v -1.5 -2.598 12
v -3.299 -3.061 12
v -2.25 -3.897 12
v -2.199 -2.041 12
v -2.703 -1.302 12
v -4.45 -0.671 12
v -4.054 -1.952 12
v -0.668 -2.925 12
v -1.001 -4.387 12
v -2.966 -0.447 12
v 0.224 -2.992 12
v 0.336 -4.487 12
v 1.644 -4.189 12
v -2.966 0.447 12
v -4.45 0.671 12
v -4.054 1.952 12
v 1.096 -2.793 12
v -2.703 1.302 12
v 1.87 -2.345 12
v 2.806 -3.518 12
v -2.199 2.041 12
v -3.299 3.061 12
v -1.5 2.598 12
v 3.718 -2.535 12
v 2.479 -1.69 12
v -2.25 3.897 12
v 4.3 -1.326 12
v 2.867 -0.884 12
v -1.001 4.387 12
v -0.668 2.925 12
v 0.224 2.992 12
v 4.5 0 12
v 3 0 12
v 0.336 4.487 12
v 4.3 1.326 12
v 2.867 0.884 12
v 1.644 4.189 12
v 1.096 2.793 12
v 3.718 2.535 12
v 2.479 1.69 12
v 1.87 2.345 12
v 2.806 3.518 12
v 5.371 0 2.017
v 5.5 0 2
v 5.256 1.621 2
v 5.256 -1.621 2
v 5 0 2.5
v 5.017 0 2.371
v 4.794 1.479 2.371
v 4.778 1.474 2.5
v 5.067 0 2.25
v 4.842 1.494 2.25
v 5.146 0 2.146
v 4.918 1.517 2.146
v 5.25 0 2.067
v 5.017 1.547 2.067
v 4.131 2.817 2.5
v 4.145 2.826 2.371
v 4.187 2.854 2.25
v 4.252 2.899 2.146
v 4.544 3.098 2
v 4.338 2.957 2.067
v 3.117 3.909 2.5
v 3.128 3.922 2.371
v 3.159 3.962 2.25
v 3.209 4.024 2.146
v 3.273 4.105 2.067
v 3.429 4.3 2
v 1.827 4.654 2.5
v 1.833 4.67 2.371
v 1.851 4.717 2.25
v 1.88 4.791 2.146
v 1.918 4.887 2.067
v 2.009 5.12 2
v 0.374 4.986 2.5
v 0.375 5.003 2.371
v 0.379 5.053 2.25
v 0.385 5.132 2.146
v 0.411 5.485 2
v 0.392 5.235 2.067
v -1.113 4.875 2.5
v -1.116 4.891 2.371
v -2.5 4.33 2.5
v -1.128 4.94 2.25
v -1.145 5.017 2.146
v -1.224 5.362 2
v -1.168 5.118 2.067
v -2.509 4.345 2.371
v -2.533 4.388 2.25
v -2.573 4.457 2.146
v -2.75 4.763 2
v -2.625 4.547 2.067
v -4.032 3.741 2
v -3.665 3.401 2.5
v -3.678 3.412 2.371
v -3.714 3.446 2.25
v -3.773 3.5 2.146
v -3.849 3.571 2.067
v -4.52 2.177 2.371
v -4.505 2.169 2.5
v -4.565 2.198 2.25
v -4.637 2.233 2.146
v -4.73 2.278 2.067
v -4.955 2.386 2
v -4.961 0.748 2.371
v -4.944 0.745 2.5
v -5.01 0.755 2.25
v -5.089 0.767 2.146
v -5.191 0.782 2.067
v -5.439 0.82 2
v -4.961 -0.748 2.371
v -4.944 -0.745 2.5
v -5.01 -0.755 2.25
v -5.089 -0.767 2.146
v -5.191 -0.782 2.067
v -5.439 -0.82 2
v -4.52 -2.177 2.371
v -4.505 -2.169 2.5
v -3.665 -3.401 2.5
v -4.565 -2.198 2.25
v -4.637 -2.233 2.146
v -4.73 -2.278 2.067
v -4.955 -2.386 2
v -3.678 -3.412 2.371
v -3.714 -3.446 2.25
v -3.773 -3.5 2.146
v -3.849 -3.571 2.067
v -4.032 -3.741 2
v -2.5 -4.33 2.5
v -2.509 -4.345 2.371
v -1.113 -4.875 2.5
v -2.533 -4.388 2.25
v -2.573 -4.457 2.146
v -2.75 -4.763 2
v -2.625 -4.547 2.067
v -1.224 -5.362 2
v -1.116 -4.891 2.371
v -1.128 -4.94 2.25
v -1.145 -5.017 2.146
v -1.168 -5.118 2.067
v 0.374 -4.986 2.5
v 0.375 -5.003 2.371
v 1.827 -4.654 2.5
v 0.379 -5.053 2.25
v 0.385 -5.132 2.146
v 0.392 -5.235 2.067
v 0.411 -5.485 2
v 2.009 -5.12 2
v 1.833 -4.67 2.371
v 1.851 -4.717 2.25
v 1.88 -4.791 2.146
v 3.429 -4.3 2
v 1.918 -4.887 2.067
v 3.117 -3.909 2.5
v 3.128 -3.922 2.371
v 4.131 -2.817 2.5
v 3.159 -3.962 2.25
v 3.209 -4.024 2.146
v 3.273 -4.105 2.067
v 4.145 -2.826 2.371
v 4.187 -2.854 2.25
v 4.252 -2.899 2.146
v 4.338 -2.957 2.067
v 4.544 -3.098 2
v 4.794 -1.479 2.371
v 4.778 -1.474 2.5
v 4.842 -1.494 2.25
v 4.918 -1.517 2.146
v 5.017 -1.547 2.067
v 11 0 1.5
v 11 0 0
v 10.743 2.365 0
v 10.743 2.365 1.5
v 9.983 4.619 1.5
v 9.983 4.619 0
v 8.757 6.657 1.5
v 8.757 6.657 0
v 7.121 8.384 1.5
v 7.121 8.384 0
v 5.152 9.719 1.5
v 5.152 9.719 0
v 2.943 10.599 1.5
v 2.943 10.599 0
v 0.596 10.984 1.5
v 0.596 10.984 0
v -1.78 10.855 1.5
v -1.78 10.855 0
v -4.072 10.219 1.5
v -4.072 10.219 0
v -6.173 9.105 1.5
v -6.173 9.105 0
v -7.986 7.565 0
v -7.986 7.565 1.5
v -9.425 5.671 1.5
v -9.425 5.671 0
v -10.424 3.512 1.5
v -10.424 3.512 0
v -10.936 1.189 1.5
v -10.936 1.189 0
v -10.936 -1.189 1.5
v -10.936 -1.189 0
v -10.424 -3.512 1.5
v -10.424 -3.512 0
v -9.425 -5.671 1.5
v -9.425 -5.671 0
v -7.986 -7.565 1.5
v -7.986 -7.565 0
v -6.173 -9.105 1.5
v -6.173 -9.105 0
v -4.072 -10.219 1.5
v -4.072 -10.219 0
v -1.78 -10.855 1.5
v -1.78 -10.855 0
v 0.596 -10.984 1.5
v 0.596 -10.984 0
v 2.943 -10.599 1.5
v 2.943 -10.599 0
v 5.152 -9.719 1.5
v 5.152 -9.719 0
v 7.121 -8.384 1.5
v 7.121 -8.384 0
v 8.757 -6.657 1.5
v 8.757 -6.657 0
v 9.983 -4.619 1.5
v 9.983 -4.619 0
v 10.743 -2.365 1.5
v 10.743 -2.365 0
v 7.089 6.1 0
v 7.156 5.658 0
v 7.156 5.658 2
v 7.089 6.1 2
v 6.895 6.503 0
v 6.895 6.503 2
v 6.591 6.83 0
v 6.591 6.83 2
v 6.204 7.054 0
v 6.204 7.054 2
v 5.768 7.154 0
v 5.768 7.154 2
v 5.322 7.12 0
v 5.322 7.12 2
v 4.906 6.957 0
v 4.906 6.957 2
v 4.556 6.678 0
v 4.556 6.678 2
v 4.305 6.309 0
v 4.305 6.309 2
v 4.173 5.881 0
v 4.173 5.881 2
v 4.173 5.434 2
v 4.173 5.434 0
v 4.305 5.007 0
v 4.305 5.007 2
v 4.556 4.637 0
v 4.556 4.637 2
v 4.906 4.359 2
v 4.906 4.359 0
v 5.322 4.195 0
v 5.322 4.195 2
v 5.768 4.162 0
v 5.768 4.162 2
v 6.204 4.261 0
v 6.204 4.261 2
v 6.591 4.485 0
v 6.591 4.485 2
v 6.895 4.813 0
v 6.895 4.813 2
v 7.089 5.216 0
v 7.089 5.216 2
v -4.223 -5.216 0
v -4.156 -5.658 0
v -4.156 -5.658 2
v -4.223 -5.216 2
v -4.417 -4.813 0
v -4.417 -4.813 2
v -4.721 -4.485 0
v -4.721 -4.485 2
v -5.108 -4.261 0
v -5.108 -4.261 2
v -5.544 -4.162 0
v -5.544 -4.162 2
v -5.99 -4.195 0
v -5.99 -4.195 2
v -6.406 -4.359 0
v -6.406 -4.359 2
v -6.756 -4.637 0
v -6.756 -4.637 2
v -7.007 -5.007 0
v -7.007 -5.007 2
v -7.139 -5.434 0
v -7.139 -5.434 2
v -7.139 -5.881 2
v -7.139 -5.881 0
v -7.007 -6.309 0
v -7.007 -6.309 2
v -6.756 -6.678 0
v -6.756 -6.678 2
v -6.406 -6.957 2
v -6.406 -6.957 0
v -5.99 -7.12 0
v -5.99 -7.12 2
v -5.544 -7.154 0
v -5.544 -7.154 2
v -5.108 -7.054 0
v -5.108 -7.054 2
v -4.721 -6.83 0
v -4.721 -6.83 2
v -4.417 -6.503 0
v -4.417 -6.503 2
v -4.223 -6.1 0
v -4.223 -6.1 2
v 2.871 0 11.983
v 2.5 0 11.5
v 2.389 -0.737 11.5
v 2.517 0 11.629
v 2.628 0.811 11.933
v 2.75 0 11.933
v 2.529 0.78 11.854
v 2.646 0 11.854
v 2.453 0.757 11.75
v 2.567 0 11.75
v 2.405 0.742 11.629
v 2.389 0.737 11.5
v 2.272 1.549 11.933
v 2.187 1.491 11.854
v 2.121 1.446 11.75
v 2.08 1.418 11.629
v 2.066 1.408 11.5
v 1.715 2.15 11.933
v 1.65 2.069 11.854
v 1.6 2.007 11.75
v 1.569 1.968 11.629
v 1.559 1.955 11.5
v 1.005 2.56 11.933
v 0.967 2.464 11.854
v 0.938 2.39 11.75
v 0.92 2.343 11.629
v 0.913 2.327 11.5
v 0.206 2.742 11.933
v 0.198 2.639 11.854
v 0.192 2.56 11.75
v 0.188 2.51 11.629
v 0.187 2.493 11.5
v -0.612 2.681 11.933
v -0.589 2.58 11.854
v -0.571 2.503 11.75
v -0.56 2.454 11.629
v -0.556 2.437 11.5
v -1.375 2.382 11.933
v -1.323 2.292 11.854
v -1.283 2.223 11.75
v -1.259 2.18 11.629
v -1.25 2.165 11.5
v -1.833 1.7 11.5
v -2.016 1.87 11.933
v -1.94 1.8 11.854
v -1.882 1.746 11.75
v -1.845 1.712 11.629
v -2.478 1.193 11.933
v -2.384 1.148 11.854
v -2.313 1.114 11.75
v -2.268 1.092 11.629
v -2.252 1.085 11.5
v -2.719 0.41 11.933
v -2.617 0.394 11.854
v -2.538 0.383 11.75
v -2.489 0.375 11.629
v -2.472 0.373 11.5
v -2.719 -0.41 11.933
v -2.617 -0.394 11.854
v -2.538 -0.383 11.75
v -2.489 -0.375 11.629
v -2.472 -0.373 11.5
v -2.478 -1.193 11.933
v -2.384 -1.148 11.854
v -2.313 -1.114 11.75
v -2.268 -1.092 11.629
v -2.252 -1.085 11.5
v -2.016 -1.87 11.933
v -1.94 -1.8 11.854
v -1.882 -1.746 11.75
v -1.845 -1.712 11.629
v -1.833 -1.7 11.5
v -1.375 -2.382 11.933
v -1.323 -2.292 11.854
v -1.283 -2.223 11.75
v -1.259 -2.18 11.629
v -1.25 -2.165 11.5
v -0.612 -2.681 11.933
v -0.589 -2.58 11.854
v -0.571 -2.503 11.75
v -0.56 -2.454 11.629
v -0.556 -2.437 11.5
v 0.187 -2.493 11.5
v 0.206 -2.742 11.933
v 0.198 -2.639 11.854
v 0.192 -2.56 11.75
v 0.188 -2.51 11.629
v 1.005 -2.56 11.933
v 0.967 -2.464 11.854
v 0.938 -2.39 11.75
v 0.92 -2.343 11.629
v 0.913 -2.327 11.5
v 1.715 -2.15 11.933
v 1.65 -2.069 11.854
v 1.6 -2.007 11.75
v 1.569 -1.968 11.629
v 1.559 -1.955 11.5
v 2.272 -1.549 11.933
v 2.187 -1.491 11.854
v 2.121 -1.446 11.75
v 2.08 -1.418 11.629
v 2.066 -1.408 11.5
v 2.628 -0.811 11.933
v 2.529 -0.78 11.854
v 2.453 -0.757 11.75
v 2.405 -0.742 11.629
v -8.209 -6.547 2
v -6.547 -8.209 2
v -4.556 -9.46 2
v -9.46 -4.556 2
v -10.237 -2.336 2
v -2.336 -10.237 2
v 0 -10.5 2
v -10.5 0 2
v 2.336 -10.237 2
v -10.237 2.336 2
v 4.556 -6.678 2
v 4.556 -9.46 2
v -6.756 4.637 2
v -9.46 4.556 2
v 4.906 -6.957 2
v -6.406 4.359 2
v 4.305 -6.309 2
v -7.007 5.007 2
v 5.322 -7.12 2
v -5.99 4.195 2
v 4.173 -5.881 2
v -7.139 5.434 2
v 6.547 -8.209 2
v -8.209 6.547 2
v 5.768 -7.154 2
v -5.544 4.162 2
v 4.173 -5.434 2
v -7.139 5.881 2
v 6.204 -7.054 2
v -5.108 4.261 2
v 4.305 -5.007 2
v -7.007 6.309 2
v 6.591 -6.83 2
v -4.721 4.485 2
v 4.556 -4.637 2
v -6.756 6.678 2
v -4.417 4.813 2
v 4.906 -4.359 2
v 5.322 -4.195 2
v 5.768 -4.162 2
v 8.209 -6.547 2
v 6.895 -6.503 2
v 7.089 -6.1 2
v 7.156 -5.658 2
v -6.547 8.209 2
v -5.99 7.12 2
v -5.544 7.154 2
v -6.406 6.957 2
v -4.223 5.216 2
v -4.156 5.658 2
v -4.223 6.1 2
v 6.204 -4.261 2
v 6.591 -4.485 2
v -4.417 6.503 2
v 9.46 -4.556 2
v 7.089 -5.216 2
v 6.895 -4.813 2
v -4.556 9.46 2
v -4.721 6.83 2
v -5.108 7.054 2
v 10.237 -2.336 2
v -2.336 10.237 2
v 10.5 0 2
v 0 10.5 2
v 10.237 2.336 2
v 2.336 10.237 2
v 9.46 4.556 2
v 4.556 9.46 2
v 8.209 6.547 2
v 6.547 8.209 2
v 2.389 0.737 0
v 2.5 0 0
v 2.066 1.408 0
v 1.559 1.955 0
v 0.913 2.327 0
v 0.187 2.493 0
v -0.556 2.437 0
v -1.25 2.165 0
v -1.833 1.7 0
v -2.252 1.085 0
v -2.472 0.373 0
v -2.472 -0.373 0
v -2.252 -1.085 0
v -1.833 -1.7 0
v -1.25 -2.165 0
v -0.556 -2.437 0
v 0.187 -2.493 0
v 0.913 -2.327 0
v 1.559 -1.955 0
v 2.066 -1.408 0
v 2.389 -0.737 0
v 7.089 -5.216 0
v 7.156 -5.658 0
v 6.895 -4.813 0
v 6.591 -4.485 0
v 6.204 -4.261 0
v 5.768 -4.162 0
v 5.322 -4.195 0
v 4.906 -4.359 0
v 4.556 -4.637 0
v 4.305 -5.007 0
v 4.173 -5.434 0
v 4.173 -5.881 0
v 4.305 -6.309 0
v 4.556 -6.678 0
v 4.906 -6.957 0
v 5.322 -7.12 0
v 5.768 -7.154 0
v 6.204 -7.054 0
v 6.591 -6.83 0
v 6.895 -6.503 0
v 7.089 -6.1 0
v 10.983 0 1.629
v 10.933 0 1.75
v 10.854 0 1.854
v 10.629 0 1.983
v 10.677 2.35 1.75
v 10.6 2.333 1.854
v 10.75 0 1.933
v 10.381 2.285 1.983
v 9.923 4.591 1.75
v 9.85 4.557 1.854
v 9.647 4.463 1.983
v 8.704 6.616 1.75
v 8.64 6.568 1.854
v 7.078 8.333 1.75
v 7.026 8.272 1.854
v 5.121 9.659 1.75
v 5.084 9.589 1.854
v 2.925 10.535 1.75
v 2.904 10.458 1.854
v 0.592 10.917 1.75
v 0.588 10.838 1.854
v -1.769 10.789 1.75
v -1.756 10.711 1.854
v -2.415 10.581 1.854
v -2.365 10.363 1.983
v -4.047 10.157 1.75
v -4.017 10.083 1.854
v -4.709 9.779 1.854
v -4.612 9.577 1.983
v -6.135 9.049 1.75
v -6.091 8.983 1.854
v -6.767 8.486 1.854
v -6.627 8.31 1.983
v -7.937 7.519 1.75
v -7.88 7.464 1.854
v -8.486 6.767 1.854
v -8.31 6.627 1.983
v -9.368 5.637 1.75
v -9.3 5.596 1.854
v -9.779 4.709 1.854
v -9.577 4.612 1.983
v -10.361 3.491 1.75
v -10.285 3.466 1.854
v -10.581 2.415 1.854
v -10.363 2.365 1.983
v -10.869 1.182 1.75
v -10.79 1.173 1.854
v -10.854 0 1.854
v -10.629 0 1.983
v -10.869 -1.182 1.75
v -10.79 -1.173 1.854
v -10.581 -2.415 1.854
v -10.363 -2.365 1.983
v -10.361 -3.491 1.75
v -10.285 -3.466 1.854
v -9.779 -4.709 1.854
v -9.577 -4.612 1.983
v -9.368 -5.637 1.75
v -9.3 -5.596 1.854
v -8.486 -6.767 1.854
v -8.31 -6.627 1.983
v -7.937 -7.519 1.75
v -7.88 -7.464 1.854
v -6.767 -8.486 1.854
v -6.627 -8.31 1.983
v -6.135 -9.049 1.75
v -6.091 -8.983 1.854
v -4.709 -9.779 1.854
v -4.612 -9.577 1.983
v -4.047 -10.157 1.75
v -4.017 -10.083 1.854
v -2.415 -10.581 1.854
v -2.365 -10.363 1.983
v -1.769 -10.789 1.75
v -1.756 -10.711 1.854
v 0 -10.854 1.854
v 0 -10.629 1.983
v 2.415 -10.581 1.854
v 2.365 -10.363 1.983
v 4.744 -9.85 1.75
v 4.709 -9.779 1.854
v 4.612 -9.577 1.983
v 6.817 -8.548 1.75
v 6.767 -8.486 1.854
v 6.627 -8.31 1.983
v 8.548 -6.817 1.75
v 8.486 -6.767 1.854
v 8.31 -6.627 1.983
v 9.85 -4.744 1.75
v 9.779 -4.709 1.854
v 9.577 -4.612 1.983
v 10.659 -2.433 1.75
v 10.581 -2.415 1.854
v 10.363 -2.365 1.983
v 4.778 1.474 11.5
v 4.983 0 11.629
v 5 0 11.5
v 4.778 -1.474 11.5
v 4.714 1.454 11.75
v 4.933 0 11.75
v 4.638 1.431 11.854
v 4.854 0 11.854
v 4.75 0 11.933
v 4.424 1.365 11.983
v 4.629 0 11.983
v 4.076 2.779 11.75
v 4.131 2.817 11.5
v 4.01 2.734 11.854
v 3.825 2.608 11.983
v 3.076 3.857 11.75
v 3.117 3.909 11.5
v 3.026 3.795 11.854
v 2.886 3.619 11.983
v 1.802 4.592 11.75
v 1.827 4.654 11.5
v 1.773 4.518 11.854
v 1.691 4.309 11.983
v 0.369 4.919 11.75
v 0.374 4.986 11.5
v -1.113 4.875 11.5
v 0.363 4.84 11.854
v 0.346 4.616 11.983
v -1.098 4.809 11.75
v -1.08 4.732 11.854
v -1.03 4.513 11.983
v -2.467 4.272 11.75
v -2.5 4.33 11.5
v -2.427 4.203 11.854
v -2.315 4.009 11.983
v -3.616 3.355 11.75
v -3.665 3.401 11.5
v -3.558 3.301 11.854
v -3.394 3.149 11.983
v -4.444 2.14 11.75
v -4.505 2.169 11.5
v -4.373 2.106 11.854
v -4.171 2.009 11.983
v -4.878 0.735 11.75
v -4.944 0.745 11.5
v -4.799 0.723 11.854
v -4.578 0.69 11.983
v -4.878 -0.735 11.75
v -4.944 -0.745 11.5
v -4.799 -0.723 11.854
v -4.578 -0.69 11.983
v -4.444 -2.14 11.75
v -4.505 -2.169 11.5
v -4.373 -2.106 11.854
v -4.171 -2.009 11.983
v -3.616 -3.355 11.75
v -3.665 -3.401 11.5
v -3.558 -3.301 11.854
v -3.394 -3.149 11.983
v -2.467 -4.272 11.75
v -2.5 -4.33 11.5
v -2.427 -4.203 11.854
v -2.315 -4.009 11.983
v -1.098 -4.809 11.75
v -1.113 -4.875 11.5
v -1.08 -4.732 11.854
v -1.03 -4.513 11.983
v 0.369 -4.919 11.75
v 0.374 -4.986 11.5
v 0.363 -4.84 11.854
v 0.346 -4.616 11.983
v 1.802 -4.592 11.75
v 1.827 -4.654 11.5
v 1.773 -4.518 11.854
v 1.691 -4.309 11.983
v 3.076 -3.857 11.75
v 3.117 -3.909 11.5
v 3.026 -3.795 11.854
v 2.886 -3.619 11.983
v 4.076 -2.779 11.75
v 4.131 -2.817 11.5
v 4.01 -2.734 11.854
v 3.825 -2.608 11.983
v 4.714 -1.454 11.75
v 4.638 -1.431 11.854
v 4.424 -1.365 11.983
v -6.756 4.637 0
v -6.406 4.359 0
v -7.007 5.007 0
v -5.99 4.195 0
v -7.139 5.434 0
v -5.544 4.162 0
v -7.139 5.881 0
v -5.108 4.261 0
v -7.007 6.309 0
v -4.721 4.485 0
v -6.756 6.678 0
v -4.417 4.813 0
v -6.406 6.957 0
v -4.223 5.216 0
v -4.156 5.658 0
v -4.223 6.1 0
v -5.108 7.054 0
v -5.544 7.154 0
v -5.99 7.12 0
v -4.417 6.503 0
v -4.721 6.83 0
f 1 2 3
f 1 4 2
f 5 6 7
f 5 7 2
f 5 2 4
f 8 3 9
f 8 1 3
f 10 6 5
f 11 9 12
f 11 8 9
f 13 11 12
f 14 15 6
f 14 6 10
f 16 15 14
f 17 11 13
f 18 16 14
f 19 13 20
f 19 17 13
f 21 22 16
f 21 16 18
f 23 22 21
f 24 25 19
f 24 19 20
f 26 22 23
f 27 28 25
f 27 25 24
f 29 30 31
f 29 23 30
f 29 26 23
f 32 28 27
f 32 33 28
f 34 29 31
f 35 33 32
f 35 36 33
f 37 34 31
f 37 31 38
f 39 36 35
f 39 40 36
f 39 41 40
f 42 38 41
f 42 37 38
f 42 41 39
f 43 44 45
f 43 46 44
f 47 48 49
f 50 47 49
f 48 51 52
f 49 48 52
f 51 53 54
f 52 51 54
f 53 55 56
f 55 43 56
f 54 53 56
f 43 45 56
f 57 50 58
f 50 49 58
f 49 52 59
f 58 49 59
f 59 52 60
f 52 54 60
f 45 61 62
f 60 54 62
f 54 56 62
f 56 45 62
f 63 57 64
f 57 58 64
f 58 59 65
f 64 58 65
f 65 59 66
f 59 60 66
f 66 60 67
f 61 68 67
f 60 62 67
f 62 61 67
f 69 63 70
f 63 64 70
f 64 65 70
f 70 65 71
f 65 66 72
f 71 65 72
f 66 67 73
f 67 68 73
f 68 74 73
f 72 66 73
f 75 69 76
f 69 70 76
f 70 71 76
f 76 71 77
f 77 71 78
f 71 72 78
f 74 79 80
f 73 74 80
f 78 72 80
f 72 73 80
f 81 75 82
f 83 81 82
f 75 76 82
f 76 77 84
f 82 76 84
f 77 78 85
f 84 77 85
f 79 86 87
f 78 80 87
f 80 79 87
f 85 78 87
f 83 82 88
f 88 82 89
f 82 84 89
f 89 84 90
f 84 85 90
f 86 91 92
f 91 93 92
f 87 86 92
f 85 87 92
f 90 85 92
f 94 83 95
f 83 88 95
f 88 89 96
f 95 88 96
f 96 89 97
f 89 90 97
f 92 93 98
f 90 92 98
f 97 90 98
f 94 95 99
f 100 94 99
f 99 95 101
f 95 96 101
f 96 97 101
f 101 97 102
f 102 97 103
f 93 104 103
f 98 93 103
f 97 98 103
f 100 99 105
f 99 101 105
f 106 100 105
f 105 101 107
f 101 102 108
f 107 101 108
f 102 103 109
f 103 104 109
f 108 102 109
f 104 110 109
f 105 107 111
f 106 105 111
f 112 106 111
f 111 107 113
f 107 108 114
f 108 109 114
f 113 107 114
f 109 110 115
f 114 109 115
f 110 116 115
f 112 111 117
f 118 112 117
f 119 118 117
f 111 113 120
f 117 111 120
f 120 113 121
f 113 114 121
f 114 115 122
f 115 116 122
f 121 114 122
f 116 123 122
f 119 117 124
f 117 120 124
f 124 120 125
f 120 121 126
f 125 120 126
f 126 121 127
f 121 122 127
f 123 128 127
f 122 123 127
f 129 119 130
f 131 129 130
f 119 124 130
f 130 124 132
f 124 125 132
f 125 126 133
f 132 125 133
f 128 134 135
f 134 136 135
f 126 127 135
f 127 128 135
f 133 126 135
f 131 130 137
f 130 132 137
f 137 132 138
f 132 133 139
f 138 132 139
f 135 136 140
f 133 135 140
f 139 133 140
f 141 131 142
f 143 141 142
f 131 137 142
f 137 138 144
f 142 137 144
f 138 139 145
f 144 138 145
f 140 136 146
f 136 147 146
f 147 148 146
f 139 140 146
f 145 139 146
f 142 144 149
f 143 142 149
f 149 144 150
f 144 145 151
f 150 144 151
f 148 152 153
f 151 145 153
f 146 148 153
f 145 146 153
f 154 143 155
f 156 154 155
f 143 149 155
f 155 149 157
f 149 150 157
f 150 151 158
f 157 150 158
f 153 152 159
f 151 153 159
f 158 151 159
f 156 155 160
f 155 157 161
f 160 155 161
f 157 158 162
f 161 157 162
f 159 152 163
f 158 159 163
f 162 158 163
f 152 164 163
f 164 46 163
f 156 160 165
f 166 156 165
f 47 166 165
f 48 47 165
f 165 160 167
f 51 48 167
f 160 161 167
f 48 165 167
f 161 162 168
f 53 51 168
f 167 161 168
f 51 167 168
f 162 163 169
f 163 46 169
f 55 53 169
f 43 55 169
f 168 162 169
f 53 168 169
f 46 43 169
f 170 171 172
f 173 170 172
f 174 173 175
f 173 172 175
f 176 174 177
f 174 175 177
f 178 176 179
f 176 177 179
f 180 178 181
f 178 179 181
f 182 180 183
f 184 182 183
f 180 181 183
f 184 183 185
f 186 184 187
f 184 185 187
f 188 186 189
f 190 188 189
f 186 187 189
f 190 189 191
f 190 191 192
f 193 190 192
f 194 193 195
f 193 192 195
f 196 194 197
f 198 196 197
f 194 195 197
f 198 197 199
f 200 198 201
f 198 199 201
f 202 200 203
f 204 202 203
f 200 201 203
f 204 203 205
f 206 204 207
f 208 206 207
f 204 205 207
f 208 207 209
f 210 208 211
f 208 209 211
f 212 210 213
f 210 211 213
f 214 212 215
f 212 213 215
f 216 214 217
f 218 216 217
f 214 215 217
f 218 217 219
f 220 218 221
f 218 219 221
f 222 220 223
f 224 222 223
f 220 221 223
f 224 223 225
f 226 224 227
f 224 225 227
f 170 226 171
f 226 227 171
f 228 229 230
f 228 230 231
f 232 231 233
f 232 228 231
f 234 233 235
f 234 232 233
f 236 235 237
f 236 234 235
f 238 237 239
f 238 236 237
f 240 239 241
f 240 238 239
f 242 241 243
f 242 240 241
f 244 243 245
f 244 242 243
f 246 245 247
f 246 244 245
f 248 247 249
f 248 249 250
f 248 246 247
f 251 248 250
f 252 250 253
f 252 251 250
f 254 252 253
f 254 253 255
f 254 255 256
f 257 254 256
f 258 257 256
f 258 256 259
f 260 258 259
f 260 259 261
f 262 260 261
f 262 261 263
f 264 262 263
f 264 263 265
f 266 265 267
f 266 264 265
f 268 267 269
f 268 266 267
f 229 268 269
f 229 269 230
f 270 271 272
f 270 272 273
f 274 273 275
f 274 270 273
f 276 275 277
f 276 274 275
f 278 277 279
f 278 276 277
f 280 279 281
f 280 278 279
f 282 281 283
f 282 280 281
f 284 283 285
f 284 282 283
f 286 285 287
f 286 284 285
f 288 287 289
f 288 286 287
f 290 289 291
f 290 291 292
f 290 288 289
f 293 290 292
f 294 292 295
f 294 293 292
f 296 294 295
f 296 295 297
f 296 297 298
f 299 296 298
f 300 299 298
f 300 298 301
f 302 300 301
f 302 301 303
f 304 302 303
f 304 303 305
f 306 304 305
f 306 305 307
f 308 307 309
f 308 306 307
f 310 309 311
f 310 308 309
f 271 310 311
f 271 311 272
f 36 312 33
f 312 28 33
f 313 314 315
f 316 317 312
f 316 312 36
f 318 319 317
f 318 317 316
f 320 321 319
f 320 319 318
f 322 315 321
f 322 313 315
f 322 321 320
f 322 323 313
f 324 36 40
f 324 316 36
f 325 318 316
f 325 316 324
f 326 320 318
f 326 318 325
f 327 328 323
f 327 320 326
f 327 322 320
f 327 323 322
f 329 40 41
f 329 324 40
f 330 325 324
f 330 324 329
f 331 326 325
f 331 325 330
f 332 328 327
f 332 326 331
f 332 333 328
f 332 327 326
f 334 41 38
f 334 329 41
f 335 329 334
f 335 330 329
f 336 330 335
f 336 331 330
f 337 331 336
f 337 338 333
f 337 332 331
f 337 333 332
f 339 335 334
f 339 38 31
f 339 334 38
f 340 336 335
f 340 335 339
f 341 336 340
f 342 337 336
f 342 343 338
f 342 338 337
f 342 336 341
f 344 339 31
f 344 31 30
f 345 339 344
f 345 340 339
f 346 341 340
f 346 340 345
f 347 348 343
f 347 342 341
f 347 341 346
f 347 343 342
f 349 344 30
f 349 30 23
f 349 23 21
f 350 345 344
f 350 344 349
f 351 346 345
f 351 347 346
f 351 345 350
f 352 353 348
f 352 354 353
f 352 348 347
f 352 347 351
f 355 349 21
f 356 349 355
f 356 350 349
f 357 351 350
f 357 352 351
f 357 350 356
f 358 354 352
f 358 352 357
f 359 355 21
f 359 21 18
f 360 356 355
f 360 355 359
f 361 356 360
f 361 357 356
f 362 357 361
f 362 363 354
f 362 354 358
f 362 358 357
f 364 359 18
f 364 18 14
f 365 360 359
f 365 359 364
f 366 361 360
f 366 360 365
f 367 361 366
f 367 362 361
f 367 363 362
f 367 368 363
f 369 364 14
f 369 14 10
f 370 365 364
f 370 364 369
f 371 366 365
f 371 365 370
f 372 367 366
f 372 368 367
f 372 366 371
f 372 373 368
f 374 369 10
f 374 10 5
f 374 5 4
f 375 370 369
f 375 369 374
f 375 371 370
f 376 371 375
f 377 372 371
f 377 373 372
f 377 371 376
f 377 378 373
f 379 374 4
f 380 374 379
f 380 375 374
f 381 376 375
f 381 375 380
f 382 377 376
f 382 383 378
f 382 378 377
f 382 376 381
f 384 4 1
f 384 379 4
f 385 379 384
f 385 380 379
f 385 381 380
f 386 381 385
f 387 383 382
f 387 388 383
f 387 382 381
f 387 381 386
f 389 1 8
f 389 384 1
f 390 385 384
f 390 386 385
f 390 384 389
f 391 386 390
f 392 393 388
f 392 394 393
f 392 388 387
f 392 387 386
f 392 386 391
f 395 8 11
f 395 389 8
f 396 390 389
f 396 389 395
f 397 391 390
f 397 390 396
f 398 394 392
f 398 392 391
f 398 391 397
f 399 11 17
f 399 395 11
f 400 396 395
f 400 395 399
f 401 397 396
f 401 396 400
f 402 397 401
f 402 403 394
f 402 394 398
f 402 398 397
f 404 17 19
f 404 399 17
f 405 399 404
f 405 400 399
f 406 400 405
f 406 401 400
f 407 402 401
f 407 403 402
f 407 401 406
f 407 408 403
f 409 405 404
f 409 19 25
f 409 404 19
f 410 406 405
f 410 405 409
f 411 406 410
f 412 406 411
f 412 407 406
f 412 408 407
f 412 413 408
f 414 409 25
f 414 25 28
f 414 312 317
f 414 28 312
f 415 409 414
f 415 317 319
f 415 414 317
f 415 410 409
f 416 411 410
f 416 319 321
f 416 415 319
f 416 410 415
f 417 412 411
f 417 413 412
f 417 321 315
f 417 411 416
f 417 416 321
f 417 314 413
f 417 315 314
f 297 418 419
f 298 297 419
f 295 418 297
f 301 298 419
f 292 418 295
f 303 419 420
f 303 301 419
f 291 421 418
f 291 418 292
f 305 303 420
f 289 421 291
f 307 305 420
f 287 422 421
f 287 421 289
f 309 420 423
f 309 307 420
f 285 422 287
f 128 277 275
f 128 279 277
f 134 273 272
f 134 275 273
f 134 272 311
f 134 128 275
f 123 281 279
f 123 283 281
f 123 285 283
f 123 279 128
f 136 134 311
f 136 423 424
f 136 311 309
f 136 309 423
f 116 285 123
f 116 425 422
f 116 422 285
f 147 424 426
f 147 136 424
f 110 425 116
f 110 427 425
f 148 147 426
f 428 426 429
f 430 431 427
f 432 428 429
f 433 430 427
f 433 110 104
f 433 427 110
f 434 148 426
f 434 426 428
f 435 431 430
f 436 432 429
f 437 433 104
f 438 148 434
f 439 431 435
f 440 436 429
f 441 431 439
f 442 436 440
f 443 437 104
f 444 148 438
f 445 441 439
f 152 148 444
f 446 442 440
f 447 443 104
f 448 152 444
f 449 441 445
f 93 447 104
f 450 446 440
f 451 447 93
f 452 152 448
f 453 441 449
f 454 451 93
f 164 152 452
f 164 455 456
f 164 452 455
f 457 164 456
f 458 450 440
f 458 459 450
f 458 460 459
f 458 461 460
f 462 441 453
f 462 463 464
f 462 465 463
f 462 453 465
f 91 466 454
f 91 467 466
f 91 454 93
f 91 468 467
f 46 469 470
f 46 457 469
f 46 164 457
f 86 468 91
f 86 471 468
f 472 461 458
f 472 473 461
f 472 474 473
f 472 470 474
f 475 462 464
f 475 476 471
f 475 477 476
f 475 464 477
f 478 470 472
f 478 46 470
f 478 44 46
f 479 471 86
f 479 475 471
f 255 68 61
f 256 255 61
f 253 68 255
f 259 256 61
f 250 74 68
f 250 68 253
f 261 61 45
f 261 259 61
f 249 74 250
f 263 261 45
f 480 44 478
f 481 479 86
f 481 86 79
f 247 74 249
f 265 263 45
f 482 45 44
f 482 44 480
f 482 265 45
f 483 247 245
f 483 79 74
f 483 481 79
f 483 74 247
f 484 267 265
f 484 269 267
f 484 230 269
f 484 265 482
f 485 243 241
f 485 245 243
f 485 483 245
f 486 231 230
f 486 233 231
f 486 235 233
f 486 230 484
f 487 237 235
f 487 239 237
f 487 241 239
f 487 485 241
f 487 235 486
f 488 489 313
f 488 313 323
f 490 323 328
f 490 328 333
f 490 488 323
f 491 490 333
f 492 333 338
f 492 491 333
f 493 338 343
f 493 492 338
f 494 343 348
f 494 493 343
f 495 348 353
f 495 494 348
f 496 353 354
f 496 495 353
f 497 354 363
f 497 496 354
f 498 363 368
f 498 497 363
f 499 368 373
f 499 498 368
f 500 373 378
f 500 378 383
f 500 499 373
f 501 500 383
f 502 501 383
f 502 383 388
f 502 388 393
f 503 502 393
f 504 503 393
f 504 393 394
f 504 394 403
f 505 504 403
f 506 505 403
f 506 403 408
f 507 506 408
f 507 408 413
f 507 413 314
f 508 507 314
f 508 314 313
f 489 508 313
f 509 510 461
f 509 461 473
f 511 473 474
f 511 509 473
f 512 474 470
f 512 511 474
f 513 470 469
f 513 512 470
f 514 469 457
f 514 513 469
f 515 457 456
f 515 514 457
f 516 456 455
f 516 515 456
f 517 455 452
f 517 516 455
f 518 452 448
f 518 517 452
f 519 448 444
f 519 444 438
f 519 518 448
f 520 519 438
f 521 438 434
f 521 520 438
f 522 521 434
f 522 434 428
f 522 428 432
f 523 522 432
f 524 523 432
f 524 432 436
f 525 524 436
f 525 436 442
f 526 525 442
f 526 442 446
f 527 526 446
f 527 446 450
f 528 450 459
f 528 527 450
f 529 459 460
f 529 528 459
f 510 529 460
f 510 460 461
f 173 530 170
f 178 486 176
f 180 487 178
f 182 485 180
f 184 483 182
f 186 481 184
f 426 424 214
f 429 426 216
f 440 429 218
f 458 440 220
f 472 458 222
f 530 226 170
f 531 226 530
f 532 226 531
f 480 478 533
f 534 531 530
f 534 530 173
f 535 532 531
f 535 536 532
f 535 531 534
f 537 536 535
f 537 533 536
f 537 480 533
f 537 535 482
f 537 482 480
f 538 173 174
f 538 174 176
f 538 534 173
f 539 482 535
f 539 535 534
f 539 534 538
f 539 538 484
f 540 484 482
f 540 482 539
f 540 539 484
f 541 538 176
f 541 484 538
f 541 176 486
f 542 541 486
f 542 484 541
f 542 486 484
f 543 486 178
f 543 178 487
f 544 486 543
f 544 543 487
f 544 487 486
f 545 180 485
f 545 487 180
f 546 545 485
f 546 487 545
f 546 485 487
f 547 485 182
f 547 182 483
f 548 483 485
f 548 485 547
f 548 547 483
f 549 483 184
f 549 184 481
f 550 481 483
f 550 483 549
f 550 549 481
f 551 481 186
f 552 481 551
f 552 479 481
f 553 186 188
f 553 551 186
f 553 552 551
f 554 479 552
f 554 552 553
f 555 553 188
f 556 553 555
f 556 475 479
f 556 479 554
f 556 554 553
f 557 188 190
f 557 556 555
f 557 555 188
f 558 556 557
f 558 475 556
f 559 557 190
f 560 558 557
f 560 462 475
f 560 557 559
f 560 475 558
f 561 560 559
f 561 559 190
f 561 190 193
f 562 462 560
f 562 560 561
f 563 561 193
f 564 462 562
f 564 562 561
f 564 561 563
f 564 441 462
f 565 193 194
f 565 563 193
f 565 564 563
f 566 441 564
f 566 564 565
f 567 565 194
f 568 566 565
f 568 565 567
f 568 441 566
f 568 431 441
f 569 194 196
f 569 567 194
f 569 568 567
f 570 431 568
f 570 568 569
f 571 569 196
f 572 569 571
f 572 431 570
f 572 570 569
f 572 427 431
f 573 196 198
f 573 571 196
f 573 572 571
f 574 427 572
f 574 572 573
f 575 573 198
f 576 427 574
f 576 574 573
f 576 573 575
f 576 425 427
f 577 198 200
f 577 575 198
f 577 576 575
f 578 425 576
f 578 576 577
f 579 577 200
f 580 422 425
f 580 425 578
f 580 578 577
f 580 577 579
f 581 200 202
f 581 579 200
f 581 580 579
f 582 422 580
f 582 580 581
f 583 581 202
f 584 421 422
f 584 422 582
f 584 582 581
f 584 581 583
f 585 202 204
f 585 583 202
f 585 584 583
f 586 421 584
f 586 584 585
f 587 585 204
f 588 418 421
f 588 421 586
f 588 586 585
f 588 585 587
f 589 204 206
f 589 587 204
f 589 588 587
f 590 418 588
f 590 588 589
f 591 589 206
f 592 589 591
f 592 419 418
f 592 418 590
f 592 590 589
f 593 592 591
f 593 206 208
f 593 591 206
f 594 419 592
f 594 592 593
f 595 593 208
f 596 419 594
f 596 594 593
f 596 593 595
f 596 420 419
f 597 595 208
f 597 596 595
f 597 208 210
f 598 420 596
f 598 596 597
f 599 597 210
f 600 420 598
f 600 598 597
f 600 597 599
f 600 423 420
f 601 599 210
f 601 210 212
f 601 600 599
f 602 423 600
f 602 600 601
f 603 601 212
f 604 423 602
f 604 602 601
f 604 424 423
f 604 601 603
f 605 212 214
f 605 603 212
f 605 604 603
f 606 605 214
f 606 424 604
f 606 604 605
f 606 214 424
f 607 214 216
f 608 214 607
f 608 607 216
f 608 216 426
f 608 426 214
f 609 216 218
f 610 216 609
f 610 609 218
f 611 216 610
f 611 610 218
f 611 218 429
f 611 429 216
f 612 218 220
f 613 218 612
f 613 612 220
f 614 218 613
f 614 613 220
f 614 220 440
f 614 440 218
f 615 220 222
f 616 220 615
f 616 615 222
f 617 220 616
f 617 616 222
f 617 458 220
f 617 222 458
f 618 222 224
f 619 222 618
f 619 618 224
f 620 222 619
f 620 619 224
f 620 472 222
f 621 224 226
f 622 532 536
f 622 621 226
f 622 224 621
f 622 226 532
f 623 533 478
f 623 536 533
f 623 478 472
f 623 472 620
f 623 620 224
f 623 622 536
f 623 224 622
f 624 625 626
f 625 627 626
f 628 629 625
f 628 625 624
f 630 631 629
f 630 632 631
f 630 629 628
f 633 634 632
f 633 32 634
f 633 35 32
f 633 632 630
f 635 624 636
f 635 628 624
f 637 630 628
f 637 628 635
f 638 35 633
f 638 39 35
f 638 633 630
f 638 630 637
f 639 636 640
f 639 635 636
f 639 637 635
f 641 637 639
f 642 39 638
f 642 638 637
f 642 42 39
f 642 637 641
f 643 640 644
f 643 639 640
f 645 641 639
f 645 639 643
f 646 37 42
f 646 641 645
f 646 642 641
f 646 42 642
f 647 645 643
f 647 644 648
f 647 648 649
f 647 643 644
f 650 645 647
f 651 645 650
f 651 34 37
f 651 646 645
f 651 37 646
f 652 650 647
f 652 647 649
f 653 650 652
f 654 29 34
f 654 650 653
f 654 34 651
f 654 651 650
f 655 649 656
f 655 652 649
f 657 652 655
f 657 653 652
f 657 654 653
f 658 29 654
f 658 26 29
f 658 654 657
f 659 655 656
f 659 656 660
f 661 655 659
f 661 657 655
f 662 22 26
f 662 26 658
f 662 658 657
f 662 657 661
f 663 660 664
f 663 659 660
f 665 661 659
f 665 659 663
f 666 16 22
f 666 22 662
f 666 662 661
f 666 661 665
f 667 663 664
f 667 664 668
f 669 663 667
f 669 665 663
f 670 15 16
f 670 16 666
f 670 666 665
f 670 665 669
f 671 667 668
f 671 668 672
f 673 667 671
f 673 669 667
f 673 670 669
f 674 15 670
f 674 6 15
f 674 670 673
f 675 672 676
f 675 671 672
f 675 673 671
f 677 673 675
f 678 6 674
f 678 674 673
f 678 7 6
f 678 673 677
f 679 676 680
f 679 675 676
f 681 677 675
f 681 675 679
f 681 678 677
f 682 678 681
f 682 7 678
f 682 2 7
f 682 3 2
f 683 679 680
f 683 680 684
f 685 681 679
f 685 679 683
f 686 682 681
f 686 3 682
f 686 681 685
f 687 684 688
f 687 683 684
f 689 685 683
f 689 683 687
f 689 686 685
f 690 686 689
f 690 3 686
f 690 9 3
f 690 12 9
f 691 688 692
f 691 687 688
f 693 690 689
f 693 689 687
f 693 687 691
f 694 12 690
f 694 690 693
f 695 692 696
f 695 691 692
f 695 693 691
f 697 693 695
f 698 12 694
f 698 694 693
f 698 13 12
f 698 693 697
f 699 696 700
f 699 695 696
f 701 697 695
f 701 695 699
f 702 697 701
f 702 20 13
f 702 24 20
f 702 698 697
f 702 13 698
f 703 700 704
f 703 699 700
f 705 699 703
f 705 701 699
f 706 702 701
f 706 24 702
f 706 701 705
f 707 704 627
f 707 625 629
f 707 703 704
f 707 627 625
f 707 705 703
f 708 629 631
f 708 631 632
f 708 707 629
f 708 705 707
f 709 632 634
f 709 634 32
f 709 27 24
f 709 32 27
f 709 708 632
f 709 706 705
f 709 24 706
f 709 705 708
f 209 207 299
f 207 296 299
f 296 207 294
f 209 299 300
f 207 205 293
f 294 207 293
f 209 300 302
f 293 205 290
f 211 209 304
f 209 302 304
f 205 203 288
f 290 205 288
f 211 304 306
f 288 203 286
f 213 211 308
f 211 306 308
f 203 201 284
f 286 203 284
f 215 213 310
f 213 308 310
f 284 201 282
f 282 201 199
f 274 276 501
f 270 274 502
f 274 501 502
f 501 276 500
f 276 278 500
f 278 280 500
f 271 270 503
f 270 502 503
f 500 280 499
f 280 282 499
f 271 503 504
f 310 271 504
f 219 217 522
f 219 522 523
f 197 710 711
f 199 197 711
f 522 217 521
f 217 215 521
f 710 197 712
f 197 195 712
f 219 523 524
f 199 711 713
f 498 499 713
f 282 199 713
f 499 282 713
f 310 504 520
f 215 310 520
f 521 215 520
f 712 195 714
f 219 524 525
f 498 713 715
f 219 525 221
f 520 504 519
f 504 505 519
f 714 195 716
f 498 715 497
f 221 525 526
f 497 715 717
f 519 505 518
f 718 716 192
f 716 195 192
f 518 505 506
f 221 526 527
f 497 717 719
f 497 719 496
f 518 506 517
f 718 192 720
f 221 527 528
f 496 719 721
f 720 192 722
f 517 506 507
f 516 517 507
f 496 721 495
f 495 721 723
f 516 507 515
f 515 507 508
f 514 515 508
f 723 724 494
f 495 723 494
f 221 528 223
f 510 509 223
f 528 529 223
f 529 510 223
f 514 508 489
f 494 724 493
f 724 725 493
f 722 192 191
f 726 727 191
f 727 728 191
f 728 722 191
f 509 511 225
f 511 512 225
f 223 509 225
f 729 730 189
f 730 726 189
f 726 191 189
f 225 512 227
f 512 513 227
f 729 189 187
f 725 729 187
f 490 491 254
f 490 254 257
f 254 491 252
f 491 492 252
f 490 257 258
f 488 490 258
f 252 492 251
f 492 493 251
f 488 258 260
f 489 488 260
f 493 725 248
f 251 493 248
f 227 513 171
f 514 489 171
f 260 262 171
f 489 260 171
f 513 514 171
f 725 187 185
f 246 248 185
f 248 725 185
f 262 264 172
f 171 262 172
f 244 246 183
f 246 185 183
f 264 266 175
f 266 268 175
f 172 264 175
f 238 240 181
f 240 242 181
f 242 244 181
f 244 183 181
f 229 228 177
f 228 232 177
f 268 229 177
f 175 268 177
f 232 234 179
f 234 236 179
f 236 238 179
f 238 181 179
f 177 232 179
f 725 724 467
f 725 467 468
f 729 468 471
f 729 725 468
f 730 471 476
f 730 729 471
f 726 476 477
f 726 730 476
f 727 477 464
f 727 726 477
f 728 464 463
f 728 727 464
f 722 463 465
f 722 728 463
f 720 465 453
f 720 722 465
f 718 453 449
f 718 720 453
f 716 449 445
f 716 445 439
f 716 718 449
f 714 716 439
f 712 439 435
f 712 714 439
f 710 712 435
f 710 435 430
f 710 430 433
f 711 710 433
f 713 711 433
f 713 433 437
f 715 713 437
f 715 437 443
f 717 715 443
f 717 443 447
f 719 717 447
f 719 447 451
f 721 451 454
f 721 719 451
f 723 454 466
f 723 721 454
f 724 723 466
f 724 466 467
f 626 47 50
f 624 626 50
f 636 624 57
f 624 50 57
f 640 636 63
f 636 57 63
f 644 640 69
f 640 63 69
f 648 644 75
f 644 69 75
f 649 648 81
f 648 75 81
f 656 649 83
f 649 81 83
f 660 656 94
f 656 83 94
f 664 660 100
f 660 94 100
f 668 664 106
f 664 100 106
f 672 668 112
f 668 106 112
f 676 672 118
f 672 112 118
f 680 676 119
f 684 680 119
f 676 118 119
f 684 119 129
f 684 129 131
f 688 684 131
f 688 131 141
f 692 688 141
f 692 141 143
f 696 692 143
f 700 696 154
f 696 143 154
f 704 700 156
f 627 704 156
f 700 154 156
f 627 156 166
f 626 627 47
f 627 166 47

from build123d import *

# Parameters (mm, degrees)
SKETCH1_R           = 11
SKETCH1_R_2         = 2.5
SKETCH1_R_3         = 1.5
BOSS_EXTRUDE1_DEPTH = 2
SKETCH2_R           = 5
SKETCH2_R_2         = 2.5
BOSS_EXTRUDE2_DEPTH = 10
FILLET1_R           = 0.5


with BuildPart() as part:
    # Sketch1 → Boss-Extrude1 (new body)
    with BuildSketch(Plane.XY):
        Circle(SKETCH1_R)
        Circle(SKETCH1_R_2, mode=Mode.SUBTRACT)
        with Locations((-5.655999742, 5.657708628)):
            Circle(SKETCH1_R_3, mode=Mode.SUBTRACT)
        with Locations((5.655999742, 5.657708628)):
            Circle(SKETCH1_R_3, mode=Mode.SUBTRACT)
        with Locations((5.655999742, -5.657708628)):
            Circle(SKETCH1_R_3, mode=Mode.SUBTRACT)
        with Locations((-5.655999742, -5.657708628)):
            Circle(SKETCH1_R_3, mode=Mode.SUBTRACT)
    extrude(amount=BOSS_EXTRUDE1_DEPTH)

    # Sketch2 → Boss-Extrude2 (add)
    with BuildSketch(Plane.XY.offset(2)):
        Circle(SKETCH2_R)
        Circle(SKETCH2_R_2, mode=Mode.SUBTRACT)
    extrude(amount=BOSS_EXTRUDE2_DEPTH)

    # Fillet1
    fillet1_edges = [part.edges().sort_by_distance(p)[0] for p in [
        (-5, 0, 12),
        (-5, 0, 2),
        (-2.5, 0, 12),
        (-11, 0, 2),
    ]]
    fillet(fillet1_edges, radius=FILLET1_R)


solid = part.part
